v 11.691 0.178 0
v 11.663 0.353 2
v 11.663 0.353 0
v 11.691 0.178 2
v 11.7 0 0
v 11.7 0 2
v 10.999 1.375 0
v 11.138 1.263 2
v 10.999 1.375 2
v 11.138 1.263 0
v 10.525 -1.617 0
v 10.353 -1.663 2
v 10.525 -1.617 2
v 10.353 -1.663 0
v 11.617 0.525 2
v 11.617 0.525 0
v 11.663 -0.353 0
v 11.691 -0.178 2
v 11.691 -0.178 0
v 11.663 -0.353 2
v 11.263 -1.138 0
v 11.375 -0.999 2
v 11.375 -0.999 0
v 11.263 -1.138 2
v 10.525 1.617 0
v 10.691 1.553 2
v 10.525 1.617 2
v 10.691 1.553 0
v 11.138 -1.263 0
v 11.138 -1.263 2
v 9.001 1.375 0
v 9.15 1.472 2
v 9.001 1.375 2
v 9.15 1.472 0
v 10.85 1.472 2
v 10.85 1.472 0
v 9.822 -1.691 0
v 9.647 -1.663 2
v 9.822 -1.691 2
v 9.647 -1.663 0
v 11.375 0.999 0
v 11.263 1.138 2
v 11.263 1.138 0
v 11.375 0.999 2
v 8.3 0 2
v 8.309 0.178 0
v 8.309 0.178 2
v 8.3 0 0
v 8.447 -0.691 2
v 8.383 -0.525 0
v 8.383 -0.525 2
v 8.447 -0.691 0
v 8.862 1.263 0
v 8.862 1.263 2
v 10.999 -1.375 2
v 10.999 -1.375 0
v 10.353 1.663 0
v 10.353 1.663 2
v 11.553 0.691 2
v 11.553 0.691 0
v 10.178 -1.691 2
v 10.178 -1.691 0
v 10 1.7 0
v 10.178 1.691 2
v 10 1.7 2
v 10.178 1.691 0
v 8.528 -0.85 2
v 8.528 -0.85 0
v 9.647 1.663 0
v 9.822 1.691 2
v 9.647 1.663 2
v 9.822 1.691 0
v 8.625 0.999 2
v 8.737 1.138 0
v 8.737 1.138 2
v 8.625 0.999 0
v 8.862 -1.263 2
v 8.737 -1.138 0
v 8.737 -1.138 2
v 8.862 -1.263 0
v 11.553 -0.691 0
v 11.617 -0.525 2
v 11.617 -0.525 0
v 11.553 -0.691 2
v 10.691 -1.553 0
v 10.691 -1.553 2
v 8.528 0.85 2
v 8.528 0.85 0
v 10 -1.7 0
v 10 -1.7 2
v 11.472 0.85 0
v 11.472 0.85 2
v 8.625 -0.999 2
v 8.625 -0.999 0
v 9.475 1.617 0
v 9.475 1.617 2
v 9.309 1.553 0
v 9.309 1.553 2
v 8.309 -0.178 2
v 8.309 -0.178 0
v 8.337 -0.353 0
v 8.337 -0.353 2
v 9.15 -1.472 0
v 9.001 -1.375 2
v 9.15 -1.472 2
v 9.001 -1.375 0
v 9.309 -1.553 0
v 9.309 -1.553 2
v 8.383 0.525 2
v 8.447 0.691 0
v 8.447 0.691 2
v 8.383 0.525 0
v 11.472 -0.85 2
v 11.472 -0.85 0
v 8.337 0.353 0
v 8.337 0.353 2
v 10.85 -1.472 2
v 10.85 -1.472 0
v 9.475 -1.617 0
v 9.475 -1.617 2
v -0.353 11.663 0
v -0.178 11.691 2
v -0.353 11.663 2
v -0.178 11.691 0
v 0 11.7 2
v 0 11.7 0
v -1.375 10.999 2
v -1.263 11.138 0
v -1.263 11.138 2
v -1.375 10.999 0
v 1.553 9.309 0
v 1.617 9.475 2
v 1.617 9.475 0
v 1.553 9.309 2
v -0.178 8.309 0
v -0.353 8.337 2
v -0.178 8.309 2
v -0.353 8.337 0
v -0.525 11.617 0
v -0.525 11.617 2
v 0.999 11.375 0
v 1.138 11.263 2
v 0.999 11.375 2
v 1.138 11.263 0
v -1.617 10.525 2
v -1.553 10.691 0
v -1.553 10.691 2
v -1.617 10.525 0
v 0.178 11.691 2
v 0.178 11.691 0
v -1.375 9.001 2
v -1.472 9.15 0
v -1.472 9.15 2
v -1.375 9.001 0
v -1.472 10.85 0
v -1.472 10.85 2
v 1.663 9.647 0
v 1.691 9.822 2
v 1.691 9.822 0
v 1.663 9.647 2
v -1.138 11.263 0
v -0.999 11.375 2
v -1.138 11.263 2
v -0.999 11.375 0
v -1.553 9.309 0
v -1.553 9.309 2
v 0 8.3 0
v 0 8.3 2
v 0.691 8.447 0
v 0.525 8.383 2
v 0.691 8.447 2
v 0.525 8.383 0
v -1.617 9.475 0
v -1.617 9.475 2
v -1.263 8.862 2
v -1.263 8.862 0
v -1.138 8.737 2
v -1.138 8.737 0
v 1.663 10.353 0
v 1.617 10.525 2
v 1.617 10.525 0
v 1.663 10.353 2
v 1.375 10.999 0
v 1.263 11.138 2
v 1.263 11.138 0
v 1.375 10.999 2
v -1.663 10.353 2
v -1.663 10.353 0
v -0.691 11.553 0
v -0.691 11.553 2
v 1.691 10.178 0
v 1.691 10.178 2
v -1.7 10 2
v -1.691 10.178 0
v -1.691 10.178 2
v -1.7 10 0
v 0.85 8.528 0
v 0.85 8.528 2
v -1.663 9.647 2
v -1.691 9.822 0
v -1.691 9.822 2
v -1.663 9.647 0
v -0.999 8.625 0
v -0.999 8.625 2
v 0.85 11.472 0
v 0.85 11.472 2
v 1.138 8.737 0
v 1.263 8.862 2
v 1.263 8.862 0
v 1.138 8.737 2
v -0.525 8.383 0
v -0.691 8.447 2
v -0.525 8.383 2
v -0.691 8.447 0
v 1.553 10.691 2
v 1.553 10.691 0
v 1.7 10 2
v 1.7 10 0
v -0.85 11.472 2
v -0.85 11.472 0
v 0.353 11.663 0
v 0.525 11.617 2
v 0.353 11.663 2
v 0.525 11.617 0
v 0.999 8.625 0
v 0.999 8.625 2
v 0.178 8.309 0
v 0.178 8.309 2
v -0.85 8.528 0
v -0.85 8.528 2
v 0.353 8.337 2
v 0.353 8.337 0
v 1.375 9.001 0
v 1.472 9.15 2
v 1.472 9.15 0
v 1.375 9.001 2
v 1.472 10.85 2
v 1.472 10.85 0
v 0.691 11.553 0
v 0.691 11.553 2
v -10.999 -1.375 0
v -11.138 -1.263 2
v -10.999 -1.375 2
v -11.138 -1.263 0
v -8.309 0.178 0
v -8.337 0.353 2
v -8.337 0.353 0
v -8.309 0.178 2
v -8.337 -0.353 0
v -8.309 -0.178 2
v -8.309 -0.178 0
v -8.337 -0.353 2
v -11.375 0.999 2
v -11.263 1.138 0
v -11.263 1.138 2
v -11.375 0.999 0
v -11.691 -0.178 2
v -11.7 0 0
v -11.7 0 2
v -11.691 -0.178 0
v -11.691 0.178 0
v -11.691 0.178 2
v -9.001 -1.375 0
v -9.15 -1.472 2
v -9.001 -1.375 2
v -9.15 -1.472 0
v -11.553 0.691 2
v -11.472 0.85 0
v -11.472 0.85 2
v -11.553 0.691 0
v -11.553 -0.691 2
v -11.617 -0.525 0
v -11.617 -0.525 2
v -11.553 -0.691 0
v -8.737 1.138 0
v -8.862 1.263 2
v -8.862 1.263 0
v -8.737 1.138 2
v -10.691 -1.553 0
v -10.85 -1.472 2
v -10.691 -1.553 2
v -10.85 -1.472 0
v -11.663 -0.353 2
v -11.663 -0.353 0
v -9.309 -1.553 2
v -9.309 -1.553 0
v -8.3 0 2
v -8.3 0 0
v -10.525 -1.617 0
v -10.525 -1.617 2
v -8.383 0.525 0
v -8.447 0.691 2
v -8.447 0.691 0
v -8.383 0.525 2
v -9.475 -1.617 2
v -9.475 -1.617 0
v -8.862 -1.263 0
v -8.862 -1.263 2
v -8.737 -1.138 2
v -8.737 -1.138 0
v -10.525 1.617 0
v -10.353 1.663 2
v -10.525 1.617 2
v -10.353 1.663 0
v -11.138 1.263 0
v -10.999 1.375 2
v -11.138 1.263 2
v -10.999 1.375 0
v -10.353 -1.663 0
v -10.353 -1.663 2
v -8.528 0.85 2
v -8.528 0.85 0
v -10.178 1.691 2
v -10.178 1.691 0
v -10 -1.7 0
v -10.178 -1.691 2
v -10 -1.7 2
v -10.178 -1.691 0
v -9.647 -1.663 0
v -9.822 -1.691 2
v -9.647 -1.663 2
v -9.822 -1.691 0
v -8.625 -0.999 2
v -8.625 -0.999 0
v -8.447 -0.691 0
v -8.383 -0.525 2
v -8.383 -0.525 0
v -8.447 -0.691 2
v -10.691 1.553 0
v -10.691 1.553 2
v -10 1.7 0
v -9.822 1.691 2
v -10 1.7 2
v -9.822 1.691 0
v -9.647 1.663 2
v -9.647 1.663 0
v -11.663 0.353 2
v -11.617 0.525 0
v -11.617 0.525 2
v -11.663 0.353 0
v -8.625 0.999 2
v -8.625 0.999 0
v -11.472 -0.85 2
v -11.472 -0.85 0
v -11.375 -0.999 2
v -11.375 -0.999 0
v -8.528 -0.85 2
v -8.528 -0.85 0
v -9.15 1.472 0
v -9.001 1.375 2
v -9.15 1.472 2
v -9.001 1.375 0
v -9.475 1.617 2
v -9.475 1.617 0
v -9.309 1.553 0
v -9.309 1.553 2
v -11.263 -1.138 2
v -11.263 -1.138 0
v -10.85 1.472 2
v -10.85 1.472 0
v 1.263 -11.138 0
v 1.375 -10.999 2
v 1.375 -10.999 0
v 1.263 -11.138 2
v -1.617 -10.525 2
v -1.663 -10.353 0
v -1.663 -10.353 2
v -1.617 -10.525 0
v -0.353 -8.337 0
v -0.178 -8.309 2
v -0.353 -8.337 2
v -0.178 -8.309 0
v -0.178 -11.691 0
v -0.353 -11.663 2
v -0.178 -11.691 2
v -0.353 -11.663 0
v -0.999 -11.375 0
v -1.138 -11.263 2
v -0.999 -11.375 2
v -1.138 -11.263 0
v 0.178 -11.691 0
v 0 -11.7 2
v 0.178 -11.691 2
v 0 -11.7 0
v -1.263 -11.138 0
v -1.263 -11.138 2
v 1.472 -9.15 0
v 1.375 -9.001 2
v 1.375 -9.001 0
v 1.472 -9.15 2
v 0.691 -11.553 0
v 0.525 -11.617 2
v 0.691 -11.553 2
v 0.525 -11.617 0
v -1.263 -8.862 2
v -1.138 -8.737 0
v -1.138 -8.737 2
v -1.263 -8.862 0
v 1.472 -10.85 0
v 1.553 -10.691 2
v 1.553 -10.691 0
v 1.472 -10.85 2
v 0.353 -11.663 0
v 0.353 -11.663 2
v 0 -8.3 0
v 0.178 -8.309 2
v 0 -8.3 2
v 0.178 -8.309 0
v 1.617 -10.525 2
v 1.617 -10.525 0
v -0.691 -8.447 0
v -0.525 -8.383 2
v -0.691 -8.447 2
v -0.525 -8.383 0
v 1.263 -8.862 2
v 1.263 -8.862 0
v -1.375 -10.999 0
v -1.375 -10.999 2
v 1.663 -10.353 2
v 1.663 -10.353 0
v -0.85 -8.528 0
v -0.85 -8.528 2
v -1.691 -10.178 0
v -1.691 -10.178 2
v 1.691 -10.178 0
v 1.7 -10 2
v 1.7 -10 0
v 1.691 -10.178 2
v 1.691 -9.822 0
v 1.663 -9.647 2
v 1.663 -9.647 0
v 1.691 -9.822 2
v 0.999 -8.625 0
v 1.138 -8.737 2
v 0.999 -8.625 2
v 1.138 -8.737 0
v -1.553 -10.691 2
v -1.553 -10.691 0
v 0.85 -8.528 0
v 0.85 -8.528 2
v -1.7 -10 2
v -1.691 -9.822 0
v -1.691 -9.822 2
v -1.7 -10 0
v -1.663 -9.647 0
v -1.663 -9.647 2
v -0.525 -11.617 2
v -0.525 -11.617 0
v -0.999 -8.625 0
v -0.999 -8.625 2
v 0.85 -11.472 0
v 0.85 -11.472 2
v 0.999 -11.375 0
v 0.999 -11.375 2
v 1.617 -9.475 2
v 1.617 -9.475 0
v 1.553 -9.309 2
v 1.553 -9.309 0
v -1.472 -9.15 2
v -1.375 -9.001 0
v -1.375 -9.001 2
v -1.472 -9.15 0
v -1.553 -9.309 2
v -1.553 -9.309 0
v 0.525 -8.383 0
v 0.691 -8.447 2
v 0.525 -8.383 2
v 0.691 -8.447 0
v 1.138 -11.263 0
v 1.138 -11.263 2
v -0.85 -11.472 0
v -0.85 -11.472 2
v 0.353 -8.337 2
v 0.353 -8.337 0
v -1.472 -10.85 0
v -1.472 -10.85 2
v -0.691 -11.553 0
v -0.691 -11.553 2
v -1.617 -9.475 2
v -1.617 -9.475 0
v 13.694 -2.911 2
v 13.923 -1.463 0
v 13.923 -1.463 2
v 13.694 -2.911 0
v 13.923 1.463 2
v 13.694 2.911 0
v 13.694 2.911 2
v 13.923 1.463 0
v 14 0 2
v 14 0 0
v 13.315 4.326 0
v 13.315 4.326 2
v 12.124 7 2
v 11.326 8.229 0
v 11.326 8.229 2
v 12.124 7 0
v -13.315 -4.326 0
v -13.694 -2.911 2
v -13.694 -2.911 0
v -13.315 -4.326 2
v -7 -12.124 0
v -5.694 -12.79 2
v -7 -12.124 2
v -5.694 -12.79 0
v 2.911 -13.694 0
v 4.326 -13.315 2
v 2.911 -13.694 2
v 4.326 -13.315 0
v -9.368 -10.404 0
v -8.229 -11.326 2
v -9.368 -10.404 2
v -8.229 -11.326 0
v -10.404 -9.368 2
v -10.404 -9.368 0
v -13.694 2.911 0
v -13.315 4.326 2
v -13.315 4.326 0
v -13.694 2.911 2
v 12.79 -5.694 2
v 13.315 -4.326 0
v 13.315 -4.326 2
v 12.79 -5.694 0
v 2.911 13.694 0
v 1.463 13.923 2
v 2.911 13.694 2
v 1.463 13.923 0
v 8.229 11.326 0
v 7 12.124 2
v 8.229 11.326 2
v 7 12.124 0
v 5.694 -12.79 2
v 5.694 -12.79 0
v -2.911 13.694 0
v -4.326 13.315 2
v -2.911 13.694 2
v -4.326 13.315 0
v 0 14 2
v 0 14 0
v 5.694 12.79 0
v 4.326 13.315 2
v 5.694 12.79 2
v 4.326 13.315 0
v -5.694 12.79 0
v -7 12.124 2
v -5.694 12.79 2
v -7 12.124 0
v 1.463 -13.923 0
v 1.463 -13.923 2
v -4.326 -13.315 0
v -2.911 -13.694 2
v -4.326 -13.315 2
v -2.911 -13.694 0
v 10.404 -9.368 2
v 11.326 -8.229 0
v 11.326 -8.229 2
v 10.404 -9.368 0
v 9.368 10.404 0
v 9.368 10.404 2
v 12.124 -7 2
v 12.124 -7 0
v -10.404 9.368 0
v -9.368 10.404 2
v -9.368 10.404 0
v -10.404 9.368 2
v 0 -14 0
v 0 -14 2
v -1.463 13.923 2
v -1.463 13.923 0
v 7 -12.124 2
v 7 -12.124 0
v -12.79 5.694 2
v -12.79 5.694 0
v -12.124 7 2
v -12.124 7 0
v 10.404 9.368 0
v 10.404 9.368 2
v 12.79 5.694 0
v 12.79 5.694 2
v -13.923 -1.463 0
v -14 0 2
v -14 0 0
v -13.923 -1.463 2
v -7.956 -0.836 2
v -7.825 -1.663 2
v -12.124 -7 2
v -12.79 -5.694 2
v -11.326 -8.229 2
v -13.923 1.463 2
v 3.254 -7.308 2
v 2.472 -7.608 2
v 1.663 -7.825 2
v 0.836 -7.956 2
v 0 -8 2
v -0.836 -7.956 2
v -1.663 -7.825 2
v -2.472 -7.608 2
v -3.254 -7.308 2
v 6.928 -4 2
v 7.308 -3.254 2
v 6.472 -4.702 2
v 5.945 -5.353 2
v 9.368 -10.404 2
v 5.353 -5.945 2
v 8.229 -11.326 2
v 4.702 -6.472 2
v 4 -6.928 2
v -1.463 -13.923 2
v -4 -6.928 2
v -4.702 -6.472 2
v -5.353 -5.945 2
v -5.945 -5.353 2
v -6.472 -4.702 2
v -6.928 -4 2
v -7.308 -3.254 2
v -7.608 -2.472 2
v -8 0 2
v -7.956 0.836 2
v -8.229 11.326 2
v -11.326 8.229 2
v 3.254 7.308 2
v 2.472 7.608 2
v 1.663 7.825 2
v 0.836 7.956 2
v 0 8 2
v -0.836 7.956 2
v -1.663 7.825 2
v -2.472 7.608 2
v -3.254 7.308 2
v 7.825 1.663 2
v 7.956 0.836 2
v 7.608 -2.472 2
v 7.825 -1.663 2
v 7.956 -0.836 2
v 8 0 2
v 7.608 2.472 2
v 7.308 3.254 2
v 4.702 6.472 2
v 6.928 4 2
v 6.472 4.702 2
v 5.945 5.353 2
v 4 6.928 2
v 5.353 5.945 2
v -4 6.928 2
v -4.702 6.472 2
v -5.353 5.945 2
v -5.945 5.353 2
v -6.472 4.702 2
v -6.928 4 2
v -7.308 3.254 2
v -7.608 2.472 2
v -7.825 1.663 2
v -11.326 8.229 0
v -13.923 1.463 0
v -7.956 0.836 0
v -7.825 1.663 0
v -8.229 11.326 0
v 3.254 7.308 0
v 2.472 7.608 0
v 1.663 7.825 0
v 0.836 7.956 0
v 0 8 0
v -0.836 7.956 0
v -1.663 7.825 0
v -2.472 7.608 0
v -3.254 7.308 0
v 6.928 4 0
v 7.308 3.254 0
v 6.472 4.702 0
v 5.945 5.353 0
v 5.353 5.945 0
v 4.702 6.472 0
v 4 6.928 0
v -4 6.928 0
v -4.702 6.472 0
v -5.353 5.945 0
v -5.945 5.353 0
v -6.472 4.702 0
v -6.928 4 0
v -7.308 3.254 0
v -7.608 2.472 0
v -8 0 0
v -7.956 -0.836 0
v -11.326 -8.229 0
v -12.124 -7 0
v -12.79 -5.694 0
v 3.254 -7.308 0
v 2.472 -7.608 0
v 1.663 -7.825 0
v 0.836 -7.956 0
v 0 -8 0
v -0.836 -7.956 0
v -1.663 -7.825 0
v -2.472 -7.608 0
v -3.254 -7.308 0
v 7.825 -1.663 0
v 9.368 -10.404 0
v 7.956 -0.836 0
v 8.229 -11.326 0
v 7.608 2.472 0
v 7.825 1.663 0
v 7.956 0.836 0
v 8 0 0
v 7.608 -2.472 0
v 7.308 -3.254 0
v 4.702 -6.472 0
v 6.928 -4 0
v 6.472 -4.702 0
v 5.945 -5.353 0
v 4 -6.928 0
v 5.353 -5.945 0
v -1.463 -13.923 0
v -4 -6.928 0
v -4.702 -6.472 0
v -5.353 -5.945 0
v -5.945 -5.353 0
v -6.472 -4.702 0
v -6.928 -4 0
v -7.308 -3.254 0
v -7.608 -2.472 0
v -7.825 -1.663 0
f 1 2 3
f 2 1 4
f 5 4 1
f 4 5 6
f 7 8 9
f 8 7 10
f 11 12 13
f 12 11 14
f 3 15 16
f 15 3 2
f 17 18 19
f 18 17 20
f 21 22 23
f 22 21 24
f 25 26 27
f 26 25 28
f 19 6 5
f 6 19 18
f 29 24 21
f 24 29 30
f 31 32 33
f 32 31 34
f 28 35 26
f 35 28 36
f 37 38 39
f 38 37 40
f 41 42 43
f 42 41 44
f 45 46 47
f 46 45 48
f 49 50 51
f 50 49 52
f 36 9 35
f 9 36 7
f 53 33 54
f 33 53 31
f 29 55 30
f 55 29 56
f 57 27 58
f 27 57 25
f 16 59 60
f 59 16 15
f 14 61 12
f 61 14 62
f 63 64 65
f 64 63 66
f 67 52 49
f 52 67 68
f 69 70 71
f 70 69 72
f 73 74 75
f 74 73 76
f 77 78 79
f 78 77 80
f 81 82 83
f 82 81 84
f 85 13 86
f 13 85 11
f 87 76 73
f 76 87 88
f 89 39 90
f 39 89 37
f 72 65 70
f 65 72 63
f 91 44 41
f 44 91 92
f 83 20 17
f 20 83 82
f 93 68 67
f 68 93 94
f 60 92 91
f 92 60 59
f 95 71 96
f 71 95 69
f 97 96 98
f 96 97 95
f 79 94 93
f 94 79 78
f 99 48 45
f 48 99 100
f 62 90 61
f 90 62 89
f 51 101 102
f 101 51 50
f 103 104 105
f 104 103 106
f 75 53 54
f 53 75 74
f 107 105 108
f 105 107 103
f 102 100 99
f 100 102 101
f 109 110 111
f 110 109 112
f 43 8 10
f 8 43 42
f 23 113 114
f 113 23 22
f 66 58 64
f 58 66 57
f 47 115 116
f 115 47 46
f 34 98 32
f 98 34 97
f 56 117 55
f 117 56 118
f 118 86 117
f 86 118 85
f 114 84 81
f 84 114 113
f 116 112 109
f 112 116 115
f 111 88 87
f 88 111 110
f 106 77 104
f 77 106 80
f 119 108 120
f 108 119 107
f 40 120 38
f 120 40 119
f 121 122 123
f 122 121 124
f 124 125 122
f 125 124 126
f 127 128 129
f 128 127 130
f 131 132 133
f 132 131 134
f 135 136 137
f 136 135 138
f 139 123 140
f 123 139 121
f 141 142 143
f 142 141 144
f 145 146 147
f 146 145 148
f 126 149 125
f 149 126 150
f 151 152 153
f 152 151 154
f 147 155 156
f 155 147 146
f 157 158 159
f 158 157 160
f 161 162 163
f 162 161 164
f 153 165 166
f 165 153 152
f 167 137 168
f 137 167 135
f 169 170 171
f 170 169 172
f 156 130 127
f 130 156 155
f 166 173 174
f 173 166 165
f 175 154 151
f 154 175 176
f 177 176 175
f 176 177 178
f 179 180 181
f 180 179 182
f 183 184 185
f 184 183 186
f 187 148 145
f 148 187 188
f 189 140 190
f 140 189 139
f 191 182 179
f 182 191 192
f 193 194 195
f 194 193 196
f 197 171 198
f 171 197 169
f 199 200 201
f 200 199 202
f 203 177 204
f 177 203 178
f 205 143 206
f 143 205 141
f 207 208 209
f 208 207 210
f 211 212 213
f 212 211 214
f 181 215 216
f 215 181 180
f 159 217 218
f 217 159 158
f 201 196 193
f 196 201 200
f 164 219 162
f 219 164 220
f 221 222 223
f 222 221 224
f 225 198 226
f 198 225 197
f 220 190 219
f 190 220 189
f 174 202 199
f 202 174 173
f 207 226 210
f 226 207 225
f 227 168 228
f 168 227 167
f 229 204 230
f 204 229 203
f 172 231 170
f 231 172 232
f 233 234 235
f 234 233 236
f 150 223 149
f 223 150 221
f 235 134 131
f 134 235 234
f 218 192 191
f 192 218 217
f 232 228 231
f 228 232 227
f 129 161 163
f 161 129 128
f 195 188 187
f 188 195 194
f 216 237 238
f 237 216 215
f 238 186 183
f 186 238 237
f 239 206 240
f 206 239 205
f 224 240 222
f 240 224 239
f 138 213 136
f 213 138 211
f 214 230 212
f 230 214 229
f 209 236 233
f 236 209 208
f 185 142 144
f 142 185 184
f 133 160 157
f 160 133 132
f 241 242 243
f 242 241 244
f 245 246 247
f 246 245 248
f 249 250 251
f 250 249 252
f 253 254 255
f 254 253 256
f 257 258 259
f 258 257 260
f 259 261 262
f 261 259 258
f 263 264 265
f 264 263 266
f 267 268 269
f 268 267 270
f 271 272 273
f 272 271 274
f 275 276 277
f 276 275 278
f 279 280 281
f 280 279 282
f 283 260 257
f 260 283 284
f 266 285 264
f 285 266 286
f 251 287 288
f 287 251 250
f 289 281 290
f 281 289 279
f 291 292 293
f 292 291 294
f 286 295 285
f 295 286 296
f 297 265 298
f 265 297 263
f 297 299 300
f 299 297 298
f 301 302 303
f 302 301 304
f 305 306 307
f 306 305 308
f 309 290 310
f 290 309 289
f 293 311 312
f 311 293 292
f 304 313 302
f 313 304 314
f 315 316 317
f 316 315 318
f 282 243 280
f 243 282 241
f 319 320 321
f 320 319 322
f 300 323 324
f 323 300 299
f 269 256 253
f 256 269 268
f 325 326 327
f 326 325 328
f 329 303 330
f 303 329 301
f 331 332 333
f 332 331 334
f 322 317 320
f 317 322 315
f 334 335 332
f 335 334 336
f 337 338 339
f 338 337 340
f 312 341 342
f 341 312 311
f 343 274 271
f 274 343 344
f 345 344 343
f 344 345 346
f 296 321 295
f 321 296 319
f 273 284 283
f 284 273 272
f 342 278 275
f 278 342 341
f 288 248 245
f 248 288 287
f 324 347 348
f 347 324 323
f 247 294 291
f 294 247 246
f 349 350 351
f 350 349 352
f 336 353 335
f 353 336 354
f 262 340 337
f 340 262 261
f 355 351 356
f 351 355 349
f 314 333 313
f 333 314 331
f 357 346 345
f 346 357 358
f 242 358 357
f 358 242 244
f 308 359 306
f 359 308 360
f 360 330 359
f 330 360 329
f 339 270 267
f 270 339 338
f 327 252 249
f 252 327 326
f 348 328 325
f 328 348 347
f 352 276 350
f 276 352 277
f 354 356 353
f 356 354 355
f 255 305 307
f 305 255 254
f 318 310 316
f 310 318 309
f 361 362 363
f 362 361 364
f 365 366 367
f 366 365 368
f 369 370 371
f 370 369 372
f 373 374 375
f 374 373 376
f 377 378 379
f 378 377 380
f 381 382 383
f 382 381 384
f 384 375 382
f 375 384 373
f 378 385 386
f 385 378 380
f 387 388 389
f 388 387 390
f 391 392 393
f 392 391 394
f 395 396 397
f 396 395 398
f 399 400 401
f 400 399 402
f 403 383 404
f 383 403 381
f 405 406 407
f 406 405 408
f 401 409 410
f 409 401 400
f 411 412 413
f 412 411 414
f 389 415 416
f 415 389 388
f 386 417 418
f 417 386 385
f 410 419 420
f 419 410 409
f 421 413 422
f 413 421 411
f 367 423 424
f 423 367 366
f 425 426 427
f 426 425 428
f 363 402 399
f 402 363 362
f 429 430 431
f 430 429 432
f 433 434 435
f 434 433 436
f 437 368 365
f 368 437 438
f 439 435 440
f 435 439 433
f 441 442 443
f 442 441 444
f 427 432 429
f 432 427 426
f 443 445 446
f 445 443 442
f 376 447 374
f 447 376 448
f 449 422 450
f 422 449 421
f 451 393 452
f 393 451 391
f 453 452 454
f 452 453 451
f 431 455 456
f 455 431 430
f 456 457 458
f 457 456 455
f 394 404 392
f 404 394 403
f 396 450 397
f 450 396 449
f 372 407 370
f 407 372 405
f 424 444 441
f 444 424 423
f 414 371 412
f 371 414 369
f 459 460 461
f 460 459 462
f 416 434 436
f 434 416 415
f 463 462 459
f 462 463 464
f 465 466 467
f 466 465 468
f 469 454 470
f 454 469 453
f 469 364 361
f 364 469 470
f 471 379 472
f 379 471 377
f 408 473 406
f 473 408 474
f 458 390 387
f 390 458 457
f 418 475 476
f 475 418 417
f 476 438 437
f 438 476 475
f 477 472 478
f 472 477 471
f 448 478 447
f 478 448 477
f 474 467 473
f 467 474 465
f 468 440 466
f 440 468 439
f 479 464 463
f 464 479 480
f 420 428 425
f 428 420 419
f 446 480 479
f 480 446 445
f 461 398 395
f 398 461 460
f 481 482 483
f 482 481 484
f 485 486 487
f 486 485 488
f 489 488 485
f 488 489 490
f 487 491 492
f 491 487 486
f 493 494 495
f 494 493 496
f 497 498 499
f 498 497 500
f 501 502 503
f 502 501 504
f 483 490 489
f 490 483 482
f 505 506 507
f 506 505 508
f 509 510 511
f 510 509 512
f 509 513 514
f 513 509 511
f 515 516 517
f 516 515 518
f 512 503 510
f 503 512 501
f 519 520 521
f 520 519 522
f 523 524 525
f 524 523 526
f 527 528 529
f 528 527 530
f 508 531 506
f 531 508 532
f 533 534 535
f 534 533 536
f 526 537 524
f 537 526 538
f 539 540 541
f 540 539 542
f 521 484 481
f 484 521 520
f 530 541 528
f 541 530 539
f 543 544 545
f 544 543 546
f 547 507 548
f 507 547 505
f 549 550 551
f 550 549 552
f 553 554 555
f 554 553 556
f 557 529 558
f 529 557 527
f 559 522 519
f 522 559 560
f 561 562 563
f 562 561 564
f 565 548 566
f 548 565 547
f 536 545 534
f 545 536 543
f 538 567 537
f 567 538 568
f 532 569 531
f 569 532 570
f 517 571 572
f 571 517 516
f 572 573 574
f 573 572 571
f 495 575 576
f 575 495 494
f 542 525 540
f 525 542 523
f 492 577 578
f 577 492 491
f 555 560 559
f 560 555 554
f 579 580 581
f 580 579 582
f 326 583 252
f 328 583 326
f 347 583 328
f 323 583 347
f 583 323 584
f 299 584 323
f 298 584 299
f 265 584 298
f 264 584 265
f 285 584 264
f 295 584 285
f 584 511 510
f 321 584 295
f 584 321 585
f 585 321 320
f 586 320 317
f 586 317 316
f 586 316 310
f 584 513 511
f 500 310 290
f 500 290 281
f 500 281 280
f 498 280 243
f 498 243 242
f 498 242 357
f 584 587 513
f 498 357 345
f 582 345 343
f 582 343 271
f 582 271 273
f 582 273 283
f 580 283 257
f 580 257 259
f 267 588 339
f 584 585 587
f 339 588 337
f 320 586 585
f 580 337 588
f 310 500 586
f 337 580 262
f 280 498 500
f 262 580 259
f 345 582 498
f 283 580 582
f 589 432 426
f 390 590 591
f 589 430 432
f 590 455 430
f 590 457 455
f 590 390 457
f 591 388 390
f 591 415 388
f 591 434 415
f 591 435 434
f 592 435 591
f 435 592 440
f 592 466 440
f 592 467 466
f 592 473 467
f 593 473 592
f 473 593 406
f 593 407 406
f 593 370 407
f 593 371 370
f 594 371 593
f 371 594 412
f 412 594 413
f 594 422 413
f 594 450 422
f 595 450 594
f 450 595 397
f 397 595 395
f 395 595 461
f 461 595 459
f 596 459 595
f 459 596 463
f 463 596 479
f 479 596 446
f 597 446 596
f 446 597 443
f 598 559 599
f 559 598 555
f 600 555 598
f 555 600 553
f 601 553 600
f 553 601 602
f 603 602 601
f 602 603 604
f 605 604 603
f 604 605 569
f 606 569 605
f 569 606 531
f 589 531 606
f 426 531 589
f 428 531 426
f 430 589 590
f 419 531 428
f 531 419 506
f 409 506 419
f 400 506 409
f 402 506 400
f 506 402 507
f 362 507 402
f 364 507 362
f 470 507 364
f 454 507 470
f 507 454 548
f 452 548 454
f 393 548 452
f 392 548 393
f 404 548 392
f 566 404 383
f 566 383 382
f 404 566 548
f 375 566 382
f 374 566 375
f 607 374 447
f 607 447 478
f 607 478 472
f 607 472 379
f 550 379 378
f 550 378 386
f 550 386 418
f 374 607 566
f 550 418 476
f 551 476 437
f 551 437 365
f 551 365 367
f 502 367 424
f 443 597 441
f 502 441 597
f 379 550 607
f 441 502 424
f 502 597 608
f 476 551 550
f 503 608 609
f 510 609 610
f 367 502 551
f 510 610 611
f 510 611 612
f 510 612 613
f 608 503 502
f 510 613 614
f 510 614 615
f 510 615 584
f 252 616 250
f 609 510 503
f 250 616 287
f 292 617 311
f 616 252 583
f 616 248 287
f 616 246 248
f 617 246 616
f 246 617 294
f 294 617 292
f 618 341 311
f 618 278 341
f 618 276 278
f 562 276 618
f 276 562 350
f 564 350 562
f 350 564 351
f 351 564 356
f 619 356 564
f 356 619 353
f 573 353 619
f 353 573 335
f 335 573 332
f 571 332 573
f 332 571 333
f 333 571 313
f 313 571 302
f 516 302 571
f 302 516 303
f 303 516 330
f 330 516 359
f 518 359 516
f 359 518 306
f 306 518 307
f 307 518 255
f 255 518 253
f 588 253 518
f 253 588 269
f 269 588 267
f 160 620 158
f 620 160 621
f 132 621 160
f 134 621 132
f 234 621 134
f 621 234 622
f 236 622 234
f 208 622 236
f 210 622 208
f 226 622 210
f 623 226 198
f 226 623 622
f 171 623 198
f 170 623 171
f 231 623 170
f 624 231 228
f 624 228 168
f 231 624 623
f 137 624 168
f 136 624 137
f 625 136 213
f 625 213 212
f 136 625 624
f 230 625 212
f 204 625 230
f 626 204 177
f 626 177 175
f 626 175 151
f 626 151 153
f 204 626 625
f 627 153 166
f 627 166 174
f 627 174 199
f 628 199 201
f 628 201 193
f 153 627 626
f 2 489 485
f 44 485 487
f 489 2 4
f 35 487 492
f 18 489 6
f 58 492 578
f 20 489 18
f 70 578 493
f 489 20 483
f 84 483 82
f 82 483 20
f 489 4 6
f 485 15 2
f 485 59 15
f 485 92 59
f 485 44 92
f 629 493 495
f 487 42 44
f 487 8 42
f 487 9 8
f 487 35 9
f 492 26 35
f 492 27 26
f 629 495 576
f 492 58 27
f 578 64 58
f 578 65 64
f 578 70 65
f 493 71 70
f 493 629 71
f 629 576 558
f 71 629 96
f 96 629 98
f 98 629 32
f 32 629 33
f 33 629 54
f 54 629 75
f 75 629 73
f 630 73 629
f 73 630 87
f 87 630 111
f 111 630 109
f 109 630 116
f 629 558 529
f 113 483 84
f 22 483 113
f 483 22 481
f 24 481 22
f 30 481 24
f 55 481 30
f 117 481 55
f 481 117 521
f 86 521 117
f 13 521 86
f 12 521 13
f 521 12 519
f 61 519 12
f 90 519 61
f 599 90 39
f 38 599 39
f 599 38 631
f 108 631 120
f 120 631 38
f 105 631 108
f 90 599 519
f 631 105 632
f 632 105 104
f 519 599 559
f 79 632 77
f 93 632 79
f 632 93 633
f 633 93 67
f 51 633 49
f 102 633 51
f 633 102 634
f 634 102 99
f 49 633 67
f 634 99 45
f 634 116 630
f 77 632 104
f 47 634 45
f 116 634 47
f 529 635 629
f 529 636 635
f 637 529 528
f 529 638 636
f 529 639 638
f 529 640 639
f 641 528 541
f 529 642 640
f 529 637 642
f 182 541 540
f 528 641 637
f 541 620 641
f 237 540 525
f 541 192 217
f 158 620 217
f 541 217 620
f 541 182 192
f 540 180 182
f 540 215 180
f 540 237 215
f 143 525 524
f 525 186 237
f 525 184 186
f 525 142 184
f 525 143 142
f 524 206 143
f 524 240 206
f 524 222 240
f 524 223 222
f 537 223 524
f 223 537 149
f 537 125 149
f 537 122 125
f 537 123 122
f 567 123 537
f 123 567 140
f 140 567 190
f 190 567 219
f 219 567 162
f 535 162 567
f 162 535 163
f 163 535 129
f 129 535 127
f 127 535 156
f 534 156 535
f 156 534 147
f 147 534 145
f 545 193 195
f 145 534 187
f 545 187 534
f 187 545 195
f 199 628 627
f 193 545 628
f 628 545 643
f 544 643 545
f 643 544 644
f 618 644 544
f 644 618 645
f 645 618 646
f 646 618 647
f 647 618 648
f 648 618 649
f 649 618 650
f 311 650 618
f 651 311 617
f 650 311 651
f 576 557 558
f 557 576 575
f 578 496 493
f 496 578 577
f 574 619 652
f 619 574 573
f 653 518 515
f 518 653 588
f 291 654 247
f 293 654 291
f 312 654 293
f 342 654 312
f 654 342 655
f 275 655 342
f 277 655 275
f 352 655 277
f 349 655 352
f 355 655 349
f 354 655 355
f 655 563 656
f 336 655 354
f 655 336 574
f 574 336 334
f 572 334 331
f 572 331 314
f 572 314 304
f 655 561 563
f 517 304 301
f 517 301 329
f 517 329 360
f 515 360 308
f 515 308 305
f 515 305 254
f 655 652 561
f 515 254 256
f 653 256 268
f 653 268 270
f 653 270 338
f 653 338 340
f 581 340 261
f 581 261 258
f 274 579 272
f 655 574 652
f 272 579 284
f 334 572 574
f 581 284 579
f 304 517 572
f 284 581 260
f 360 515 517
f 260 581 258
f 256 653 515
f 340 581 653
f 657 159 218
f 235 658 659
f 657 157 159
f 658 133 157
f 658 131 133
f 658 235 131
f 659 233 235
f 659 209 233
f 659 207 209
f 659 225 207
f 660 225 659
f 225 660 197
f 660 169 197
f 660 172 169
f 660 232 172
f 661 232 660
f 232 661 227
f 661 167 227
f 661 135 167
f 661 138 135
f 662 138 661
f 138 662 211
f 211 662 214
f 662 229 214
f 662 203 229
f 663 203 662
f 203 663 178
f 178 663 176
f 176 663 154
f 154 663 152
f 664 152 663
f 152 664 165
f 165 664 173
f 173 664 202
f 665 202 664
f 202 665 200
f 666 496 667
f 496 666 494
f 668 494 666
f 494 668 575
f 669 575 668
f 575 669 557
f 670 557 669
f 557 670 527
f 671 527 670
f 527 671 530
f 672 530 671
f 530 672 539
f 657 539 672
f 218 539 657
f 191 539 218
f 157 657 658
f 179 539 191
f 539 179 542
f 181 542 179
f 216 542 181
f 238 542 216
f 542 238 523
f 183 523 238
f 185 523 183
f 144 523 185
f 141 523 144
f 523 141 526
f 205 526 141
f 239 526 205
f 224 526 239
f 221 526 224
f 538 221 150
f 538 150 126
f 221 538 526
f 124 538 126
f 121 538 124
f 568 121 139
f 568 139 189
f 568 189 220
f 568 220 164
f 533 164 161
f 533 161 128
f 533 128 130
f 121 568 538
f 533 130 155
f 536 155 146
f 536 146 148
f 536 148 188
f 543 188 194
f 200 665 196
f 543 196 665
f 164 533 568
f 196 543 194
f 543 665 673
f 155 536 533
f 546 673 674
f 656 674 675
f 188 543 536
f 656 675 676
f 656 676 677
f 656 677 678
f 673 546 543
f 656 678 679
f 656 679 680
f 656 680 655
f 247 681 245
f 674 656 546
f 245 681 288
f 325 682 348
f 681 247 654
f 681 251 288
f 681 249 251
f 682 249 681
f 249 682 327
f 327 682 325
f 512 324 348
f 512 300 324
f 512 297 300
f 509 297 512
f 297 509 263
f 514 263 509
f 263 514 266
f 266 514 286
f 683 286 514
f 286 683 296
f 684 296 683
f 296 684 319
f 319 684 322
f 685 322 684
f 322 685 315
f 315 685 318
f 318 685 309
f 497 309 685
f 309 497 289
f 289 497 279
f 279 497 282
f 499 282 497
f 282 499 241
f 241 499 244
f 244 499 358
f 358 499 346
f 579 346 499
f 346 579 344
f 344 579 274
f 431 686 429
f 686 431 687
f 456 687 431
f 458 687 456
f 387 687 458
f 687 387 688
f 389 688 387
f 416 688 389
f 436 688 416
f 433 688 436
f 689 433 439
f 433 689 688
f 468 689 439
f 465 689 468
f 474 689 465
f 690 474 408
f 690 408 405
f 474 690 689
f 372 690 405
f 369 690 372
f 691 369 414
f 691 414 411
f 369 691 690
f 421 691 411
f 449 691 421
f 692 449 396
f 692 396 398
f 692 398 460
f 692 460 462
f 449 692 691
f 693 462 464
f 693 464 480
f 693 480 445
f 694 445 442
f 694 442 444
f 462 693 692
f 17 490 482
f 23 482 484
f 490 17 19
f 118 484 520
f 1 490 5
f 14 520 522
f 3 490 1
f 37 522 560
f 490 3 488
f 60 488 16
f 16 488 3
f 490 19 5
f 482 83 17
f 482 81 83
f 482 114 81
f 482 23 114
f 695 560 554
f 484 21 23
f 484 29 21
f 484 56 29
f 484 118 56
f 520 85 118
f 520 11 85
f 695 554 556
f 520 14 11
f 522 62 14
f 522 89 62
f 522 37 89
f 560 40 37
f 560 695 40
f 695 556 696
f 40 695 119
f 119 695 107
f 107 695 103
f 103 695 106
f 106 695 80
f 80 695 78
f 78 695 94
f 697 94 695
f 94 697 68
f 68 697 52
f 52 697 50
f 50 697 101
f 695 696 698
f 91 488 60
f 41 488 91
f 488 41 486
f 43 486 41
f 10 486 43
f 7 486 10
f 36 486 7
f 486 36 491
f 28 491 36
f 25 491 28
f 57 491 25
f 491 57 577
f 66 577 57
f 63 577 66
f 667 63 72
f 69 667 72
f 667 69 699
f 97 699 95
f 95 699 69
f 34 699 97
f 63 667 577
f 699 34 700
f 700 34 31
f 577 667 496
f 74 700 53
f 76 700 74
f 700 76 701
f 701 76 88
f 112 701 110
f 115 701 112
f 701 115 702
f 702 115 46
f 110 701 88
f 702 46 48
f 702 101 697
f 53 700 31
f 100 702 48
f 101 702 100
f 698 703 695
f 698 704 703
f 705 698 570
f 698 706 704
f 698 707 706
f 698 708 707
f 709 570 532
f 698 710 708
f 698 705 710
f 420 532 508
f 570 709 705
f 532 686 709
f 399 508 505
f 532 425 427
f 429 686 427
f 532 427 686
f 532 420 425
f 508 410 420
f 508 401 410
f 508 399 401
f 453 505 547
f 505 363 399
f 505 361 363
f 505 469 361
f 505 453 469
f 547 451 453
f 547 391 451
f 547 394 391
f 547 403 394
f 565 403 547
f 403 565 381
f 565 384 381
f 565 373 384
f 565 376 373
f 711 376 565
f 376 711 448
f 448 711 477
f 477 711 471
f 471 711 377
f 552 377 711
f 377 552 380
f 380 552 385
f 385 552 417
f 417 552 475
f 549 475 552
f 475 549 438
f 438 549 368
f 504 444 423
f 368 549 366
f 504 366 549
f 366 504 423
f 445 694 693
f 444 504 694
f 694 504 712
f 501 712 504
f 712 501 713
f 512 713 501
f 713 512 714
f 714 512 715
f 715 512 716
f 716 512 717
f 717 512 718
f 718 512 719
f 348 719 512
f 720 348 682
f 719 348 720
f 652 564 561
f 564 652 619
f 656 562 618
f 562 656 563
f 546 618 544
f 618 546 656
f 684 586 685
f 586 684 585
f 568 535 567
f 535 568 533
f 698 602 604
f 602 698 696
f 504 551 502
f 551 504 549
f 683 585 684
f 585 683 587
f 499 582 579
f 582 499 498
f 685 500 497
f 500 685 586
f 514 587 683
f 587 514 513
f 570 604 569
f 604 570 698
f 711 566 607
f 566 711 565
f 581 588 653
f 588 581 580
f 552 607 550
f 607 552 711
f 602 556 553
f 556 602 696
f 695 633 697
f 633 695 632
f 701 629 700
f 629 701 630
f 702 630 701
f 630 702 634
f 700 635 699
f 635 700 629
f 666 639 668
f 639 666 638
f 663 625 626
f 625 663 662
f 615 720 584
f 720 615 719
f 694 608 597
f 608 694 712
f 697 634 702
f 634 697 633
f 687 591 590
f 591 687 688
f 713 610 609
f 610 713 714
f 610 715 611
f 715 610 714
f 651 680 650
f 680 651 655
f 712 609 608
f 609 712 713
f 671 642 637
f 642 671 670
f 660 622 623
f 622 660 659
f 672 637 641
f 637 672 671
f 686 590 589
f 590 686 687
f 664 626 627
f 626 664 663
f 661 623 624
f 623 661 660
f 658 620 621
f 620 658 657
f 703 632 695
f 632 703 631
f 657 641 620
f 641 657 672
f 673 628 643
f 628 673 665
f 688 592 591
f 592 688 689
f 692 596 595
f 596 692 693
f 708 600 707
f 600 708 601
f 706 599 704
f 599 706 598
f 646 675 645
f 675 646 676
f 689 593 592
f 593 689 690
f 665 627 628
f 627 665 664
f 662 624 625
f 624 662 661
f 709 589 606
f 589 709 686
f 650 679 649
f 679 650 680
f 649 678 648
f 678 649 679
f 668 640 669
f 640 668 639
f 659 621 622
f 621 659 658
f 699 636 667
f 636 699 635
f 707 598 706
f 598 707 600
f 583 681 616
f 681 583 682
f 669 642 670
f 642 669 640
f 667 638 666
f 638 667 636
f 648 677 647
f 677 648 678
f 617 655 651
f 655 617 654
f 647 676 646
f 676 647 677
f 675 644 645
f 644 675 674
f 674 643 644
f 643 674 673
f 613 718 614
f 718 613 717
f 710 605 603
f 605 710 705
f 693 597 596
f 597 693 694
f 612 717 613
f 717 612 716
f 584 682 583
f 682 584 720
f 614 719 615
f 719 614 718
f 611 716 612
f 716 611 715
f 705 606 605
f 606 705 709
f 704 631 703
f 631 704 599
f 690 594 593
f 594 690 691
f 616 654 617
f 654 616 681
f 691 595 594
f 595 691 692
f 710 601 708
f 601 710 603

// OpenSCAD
// Bearing retaining ring.
$fn = 60;
eps = 0.02;
bearing_d = 16;
outer_d = 28;
thickness = 2;
difference() {
    cylinder(d=outer_d,h=thickness);
    translate([0,0,-eps]) cylinder(d=bearing_d,h=thickness+2*eps);
    for (i=[0:3]) rotate([0,0,i*90]) translate([outer_d/2-4,0,-eps]) cylinder(d=3.4,h=thickness+2*eps);
}
